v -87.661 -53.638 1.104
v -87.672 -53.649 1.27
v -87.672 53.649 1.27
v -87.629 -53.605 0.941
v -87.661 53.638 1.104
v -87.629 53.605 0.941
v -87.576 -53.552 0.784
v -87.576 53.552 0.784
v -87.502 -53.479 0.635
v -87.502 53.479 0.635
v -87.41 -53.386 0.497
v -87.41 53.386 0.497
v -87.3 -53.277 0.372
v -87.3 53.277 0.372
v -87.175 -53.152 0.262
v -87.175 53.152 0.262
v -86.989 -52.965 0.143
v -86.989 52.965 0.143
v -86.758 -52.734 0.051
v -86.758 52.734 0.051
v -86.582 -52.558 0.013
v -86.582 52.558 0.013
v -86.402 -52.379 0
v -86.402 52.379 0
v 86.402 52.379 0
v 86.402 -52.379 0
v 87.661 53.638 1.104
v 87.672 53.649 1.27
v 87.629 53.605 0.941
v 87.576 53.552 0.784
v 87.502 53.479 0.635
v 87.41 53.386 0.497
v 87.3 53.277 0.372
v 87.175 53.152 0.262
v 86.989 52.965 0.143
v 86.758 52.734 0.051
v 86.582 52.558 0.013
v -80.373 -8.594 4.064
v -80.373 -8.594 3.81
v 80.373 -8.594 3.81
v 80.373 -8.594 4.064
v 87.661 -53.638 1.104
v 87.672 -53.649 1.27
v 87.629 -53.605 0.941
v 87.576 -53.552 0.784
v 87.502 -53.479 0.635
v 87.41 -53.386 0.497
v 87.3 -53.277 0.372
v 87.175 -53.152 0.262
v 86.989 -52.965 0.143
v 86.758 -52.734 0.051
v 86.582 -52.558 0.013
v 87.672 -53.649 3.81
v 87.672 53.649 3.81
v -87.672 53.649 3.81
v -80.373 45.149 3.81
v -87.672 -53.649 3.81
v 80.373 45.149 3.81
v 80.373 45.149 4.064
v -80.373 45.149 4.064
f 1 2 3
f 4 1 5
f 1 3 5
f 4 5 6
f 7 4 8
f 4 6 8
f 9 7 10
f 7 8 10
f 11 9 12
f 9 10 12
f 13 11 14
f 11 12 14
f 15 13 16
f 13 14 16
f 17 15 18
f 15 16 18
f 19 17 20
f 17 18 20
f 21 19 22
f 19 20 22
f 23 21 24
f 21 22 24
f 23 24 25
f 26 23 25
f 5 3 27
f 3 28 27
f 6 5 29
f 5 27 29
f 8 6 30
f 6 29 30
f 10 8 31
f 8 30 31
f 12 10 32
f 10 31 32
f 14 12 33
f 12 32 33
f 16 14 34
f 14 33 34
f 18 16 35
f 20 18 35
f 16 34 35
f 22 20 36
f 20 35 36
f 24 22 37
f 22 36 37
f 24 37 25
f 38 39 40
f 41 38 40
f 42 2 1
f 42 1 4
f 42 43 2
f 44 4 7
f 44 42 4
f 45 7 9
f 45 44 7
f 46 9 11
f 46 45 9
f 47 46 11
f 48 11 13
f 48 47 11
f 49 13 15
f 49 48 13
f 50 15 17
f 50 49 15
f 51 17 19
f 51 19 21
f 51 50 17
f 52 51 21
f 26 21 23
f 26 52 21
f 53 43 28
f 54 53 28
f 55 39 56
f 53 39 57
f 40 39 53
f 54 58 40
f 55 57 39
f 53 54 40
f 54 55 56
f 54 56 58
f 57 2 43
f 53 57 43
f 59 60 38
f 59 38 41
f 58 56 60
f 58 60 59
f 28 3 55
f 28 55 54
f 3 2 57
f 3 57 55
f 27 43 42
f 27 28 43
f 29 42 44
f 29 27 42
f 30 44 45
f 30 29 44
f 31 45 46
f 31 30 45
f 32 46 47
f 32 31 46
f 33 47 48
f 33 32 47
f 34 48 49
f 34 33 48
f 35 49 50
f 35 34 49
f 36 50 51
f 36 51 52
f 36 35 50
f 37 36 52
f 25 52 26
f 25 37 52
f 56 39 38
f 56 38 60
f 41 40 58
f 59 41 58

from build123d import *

# Parameters (mm, degrees)
F0_W     = 175.344706
F0_H     = 107.297548
F1_DEPTH = 3.81
F2_R     = 1.27
F3_W     = 73.110506
F3_H     = 41.154918
F4_DEPTH = 2.54
F5_W     = 160.746276
F5_H     = 53.74348
F6_DEPTH = 0.254


with BuildPart() as f1:
    # F0 (on Top) → F1 (new body)
    with BuildSketch(Plane.XY):
        Rectangle(F0_W, F0_H)
    extrude(amount=F1_DEPTH)

    # F2
    f2_edges = [f1.edges().sort_by_distance(p)[0] for p in [
        (87.672353, 0, 0),
        (0, -53.648774, 0),
        (0, 53.648774, 0),
        (-87.672353, 0, 0),
    ]]
    fillet(f2_edges, radius=F2_R)

    # F3 (on face) → F4 (join)
    with BuildSketch(Plane.XY.offset(3.81)):
        with Locations((0, -30.382013)):
            Rectangle(F3_W, F3_H)
    extrude(amount=-F4_DEPTH)

    # F5 (on face) → F6 (join)
    with BuildSketch(Plane.XY.offset(3.81)):
        with Locations((0, 18.277625)):
            Rectangle(F5_W, F5_H)
    extrude(amount=F6_DEPTH)


solid = f1.part
